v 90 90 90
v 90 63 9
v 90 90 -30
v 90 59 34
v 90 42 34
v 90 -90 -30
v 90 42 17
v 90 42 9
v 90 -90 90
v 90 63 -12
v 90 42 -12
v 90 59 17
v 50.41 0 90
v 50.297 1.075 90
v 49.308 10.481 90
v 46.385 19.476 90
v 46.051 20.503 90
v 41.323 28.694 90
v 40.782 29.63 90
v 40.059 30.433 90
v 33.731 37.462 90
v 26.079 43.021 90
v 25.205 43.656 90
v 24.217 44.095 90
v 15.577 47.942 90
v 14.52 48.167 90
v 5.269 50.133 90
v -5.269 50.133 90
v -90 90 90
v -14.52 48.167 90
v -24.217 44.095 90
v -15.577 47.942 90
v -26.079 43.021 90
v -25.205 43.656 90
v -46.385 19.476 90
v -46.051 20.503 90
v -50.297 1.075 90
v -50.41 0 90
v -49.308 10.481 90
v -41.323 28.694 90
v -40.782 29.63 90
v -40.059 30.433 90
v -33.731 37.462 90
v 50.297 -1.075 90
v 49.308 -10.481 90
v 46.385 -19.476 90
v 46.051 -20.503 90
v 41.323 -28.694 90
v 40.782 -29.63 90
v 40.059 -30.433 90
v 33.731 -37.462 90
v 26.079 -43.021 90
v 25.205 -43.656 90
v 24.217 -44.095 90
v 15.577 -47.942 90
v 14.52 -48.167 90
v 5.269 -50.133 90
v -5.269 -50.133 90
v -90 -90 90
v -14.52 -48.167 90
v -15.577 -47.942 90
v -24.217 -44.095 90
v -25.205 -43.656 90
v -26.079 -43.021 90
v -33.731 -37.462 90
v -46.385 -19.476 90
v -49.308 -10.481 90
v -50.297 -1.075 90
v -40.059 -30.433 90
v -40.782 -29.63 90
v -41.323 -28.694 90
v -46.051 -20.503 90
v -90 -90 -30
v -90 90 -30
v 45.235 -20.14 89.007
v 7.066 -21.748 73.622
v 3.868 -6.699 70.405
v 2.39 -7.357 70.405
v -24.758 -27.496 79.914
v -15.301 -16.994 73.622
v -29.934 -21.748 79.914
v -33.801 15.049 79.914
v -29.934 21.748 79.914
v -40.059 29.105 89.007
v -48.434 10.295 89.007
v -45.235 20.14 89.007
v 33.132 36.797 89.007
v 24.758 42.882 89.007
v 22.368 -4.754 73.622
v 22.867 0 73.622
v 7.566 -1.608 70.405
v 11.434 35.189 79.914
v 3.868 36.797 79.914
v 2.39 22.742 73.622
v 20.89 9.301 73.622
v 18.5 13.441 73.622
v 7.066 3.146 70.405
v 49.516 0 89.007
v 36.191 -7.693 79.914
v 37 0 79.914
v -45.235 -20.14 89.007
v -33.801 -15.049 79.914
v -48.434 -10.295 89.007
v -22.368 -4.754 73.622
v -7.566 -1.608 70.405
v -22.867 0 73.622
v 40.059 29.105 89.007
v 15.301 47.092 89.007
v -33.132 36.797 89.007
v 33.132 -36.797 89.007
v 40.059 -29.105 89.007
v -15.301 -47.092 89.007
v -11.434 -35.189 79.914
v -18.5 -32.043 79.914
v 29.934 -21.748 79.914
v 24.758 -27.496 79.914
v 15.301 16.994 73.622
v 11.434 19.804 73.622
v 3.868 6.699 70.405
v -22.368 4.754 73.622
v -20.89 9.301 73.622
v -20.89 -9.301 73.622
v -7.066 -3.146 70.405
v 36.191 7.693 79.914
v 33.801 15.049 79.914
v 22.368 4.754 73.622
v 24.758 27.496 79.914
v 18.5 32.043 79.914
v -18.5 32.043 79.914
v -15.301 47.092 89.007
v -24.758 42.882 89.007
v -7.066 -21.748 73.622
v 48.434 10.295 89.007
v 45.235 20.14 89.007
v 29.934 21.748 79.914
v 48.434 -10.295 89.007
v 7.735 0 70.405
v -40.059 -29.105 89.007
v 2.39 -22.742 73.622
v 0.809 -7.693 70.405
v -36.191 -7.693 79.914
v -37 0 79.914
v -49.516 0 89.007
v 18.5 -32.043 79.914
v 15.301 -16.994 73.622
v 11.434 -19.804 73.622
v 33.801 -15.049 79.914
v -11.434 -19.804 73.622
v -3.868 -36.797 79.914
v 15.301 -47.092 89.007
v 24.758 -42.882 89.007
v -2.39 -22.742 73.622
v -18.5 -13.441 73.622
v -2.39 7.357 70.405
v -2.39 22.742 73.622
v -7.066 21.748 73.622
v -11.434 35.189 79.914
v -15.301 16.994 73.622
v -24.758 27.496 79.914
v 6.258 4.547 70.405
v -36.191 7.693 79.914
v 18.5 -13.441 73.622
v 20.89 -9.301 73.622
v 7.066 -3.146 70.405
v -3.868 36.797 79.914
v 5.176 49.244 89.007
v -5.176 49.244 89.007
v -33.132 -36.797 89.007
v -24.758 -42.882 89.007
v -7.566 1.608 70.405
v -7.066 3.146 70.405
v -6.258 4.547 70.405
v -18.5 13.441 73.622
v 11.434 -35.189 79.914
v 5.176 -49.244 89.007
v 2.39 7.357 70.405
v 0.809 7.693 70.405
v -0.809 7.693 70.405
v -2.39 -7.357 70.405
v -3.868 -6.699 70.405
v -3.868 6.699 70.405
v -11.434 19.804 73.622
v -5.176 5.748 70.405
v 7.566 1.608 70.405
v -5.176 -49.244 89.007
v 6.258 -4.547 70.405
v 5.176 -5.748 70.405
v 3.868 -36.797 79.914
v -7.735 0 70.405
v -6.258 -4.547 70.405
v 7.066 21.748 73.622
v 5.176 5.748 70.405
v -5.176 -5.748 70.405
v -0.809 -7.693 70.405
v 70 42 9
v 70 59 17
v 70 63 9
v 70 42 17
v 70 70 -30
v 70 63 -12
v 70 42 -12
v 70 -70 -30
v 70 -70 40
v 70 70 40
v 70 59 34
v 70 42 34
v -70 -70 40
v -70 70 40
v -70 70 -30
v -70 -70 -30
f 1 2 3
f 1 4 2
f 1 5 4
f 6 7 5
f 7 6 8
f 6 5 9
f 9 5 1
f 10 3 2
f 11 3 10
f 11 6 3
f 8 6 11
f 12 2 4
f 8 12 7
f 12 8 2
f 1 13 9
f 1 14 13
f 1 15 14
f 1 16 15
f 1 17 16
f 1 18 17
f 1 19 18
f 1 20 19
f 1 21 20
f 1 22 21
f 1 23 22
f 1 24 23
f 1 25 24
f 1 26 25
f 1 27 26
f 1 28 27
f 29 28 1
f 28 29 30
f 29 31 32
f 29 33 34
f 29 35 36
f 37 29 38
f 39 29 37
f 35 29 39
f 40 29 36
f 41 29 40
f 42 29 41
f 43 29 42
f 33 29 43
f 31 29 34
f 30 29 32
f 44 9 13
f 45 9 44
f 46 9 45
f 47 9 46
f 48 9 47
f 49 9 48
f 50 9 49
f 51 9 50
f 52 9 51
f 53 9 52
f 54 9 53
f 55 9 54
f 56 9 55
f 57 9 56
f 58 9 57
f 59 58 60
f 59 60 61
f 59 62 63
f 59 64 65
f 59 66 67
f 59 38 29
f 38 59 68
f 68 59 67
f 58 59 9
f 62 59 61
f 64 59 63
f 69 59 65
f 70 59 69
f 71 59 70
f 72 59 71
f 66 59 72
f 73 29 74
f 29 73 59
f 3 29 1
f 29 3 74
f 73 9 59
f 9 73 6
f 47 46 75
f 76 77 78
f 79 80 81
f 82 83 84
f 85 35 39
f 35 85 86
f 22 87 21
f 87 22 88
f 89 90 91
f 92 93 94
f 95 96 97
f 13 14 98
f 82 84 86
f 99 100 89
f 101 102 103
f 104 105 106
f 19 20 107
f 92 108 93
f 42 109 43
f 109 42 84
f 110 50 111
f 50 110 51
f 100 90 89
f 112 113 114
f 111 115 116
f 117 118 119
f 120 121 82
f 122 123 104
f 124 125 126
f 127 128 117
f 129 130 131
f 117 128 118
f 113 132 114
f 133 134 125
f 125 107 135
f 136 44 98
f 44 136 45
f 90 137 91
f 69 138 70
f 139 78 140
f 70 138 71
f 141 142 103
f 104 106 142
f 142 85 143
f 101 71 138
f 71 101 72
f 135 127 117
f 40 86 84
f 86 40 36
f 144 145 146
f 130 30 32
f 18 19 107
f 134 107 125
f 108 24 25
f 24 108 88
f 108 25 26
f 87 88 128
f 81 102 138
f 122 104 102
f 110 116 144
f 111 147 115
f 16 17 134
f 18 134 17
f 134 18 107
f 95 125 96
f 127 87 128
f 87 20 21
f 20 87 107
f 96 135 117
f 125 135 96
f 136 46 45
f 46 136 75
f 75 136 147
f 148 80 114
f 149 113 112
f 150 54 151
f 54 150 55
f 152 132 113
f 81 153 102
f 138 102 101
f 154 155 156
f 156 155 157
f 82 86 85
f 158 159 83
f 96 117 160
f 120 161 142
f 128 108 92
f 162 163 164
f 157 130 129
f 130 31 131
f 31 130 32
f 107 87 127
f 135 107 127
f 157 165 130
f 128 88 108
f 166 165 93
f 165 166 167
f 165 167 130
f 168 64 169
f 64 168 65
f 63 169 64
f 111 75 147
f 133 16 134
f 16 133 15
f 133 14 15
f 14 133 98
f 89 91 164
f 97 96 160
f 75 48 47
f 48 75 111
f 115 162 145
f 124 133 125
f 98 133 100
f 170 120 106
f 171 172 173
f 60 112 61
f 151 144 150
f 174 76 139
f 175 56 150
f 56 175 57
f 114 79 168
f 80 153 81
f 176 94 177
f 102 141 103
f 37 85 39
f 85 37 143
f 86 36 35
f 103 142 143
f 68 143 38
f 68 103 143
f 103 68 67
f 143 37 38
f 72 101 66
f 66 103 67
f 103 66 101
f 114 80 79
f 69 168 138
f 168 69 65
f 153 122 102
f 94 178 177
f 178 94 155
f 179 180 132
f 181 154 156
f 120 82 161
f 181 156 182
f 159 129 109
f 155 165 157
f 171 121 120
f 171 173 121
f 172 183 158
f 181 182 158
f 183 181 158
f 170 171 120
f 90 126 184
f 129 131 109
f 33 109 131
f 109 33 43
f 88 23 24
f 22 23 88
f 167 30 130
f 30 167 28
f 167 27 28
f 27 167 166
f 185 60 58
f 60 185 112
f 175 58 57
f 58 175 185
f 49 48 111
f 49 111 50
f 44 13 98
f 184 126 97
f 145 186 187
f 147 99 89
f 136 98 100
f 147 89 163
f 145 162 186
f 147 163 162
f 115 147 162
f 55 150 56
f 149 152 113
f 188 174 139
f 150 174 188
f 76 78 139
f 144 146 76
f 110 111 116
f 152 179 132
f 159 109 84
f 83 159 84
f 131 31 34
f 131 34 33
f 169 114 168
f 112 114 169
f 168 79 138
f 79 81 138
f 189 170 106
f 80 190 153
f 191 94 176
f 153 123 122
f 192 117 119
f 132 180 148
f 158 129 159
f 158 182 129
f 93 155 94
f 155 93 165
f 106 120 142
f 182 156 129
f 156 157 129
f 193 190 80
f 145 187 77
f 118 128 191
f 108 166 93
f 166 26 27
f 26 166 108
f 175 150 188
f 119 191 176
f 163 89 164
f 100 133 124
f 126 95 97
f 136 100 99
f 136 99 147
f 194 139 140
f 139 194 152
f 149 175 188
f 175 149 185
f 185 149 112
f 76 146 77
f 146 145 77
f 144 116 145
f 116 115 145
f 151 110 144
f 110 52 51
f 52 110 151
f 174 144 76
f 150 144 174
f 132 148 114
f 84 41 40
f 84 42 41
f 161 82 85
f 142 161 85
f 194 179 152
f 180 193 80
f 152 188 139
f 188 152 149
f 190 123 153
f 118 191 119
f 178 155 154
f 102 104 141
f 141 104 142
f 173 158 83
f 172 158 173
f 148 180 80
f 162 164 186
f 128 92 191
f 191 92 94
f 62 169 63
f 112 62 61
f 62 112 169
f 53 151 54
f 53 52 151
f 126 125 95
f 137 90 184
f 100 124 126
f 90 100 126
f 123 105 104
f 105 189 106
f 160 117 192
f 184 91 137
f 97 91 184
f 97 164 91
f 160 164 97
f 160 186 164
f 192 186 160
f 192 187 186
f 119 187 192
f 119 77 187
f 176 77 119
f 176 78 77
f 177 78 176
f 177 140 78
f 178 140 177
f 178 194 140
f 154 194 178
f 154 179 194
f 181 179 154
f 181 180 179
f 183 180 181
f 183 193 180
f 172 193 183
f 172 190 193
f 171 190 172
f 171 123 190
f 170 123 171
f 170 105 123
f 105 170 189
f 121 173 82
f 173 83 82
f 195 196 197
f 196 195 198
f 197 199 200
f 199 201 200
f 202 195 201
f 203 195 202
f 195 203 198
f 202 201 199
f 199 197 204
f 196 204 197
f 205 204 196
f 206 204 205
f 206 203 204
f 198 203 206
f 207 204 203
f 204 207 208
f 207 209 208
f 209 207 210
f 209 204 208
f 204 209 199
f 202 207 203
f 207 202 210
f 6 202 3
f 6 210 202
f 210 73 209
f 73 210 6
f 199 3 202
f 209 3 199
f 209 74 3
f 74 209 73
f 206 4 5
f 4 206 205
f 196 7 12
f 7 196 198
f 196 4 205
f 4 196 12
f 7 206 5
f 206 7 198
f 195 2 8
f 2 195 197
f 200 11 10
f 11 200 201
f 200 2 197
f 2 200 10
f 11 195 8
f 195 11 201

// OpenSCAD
 

difference () {
    color ("orange") cube(size=180, center=true);    
    translate ([0,0,144]) color ("silver")sphere (r=74);
    translate ([-70,-70,-100]) color ("indigo") cube(size=140);
    translate ([-100,-100,-230]) color ("indigo") cube(size=200);
    translate ([30,42,17]) color ("yellow") cube ([100,17,17]);
    translate ([30,42,-12]) color ("red") cube ([100,21,21]);
  }
